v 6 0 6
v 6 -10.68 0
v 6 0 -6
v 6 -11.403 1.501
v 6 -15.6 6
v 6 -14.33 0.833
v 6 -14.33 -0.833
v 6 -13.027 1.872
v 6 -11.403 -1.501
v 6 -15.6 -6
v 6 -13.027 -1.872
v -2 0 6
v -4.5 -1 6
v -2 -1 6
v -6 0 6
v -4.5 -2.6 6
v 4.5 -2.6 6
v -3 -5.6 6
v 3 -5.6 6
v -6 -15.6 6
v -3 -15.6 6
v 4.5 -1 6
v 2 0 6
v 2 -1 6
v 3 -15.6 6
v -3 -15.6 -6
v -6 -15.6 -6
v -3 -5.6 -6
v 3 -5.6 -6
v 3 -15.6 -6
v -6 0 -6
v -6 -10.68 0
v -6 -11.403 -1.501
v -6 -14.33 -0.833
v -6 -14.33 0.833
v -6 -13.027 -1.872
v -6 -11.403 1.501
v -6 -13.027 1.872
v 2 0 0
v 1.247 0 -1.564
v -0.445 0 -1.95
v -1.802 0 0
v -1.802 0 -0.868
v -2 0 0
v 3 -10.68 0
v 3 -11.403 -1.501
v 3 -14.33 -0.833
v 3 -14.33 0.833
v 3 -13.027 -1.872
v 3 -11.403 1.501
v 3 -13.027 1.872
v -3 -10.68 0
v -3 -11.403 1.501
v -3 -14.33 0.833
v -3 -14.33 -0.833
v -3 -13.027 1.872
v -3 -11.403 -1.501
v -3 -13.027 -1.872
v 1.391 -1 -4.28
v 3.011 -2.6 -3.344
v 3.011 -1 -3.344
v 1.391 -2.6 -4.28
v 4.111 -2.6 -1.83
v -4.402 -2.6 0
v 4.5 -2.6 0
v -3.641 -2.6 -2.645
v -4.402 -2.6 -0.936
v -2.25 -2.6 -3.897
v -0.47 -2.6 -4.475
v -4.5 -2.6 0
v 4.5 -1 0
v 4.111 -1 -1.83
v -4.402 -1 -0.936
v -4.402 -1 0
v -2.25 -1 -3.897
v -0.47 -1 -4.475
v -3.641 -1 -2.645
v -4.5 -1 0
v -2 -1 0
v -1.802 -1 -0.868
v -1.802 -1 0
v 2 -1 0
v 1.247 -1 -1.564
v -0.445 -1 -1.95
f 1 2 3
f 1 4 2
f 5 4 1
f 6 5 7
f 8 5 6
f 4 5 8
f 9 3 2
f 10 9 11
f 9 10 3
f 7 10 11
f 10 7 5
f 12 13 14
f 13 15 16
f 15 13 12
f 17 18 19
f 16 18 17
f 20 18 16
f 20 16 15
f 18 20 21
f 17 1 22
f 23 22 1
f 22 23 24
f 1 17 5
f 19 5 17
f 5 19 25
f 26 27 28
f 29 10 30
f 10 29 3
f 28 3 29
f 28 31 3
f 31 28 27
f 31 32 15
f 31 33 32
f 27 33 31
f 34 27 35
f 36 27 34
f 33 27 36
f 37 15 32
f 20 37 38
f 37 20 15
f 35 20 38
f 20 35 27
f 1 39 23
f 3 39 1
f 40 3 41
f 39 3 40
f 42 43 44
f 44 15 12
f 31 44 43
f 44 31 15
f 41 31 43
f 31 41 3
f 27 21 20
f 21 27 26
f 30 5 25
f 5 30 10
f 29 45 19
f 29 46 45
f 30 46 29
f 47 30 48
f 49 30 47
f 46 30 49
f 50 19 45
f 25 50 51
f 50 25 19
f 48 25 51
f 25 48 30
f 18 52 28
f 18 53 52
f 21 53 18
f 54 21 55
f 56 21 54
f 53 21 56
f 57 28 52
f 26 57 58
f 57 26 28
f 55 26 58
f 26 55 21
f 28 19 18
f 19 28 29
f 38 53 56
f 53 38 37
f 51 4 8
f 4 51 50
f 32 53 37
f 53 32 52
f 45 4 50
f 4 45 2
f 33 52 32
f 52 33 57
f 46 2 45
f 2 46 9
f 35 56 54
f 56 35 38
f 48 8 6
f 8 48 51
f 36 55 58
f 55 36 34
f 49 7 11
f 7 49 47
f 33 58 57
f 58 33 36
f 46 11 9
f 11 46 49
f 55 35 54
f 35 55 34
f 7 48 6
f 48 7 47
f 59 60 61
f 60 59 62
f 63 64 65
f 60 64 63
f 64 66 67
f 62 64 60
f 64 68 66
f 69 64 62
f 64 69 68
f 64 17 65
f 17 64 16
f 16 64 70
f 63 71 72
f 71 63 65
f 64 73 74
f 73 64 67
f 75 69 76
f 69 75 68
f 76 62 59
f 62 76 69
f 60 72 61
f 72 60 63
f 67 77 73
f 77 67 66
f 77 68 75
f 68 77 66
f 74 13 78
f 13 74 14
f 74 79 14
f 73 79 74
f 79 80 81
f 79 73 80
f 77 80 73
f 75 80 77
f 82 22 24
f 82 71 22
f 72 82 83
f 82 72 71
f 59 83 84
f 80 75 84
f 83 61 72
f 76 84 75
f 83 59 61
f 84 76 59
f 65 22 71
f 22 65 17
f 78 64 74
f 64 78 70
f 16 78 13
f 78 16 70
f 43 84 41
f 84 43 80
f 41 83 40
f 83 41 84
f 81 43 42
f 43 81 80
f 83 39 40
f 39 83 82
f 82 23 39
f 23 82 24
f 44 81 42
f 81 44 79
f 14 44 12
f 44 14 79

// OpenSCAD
//Change to suit your system

///// 1cc DONE
syringe_thickness_in = 1.6;
syringe_diameter_in = 8.5;
syringe_slots_diameter = 4;

///// 3cc DONE
//syringe_thickness_in = 1.45;
//syringe_diameter_in = 12.65;
//syringe_slots_diameter = 9;

///// 10cc DONE
//syringe_thickness_in = 1.85;
//syringe_diameter_in = 16.65;
//syringe_slots_diameter = 11;

///// 60cc DONE
//syringe_thickness_in = 2.6;
//syringe_diameter_in = 30.5;
//syringe_slots_diameter = 19;



// Do not change
syringe_thickness = syringe_thickness_in;
syringe_diameter = syringe_diameter_in + 0.5;
hole_r = 2.64/2 + .6;
padding = 3;
syringe_lip = 1;
piston_rod_slot_l = 10;
piston_rod_slot_w = 6;

body_w = syringe_diameter+padding;
body_l = syringe_lip+syringe_thickness+padding+piston_rod_slot_l;
body_h = syringe_diameter+padding;


difference(){
    //Main body
    translate([0,-body_l/2,0])
    cube([body_w,body_l,body_h],center=true);
    
    // Piston_rod attachment slot
    translate([0,-body_l+piston_rod_slot_l/2,0])
    cube([piston_rod_slot_w,piston_rod_slot_l,body_h*2],center=true);
    
    // Piston_rod screw hole
    translate([-body_w,-body_l+3,0])
    rotate([90,0,90])
    cylinder(h=body_w*2,r=hole_r);
    
    
    // Inner circle
    translate([0,-syringe_lip,0])
    rotate([90,0,0])
    cylinder(h=syringe_thickness, r=syringe_diameter/2);
    
    // Inner Square extrusion
    translate([-syringe_diameter/2,-syringe_thickness-syringe_lip,0])
    cube([syringe_diameter,syringe_thickness,body_h/2]); 
    
    
    // Outer circle
    translate([0,0,0])
    rotate([90,0,0])
    cylinder(h=syringe_lip, r=syringe_slots_diameter/2);
    
    // Outer Square extrusion
    translate([-syringe_slots_diameter/2,-syringe_lip,0])
    cube([syringe_slots_diameter,syringe_lip,body_h/2]);     
}
